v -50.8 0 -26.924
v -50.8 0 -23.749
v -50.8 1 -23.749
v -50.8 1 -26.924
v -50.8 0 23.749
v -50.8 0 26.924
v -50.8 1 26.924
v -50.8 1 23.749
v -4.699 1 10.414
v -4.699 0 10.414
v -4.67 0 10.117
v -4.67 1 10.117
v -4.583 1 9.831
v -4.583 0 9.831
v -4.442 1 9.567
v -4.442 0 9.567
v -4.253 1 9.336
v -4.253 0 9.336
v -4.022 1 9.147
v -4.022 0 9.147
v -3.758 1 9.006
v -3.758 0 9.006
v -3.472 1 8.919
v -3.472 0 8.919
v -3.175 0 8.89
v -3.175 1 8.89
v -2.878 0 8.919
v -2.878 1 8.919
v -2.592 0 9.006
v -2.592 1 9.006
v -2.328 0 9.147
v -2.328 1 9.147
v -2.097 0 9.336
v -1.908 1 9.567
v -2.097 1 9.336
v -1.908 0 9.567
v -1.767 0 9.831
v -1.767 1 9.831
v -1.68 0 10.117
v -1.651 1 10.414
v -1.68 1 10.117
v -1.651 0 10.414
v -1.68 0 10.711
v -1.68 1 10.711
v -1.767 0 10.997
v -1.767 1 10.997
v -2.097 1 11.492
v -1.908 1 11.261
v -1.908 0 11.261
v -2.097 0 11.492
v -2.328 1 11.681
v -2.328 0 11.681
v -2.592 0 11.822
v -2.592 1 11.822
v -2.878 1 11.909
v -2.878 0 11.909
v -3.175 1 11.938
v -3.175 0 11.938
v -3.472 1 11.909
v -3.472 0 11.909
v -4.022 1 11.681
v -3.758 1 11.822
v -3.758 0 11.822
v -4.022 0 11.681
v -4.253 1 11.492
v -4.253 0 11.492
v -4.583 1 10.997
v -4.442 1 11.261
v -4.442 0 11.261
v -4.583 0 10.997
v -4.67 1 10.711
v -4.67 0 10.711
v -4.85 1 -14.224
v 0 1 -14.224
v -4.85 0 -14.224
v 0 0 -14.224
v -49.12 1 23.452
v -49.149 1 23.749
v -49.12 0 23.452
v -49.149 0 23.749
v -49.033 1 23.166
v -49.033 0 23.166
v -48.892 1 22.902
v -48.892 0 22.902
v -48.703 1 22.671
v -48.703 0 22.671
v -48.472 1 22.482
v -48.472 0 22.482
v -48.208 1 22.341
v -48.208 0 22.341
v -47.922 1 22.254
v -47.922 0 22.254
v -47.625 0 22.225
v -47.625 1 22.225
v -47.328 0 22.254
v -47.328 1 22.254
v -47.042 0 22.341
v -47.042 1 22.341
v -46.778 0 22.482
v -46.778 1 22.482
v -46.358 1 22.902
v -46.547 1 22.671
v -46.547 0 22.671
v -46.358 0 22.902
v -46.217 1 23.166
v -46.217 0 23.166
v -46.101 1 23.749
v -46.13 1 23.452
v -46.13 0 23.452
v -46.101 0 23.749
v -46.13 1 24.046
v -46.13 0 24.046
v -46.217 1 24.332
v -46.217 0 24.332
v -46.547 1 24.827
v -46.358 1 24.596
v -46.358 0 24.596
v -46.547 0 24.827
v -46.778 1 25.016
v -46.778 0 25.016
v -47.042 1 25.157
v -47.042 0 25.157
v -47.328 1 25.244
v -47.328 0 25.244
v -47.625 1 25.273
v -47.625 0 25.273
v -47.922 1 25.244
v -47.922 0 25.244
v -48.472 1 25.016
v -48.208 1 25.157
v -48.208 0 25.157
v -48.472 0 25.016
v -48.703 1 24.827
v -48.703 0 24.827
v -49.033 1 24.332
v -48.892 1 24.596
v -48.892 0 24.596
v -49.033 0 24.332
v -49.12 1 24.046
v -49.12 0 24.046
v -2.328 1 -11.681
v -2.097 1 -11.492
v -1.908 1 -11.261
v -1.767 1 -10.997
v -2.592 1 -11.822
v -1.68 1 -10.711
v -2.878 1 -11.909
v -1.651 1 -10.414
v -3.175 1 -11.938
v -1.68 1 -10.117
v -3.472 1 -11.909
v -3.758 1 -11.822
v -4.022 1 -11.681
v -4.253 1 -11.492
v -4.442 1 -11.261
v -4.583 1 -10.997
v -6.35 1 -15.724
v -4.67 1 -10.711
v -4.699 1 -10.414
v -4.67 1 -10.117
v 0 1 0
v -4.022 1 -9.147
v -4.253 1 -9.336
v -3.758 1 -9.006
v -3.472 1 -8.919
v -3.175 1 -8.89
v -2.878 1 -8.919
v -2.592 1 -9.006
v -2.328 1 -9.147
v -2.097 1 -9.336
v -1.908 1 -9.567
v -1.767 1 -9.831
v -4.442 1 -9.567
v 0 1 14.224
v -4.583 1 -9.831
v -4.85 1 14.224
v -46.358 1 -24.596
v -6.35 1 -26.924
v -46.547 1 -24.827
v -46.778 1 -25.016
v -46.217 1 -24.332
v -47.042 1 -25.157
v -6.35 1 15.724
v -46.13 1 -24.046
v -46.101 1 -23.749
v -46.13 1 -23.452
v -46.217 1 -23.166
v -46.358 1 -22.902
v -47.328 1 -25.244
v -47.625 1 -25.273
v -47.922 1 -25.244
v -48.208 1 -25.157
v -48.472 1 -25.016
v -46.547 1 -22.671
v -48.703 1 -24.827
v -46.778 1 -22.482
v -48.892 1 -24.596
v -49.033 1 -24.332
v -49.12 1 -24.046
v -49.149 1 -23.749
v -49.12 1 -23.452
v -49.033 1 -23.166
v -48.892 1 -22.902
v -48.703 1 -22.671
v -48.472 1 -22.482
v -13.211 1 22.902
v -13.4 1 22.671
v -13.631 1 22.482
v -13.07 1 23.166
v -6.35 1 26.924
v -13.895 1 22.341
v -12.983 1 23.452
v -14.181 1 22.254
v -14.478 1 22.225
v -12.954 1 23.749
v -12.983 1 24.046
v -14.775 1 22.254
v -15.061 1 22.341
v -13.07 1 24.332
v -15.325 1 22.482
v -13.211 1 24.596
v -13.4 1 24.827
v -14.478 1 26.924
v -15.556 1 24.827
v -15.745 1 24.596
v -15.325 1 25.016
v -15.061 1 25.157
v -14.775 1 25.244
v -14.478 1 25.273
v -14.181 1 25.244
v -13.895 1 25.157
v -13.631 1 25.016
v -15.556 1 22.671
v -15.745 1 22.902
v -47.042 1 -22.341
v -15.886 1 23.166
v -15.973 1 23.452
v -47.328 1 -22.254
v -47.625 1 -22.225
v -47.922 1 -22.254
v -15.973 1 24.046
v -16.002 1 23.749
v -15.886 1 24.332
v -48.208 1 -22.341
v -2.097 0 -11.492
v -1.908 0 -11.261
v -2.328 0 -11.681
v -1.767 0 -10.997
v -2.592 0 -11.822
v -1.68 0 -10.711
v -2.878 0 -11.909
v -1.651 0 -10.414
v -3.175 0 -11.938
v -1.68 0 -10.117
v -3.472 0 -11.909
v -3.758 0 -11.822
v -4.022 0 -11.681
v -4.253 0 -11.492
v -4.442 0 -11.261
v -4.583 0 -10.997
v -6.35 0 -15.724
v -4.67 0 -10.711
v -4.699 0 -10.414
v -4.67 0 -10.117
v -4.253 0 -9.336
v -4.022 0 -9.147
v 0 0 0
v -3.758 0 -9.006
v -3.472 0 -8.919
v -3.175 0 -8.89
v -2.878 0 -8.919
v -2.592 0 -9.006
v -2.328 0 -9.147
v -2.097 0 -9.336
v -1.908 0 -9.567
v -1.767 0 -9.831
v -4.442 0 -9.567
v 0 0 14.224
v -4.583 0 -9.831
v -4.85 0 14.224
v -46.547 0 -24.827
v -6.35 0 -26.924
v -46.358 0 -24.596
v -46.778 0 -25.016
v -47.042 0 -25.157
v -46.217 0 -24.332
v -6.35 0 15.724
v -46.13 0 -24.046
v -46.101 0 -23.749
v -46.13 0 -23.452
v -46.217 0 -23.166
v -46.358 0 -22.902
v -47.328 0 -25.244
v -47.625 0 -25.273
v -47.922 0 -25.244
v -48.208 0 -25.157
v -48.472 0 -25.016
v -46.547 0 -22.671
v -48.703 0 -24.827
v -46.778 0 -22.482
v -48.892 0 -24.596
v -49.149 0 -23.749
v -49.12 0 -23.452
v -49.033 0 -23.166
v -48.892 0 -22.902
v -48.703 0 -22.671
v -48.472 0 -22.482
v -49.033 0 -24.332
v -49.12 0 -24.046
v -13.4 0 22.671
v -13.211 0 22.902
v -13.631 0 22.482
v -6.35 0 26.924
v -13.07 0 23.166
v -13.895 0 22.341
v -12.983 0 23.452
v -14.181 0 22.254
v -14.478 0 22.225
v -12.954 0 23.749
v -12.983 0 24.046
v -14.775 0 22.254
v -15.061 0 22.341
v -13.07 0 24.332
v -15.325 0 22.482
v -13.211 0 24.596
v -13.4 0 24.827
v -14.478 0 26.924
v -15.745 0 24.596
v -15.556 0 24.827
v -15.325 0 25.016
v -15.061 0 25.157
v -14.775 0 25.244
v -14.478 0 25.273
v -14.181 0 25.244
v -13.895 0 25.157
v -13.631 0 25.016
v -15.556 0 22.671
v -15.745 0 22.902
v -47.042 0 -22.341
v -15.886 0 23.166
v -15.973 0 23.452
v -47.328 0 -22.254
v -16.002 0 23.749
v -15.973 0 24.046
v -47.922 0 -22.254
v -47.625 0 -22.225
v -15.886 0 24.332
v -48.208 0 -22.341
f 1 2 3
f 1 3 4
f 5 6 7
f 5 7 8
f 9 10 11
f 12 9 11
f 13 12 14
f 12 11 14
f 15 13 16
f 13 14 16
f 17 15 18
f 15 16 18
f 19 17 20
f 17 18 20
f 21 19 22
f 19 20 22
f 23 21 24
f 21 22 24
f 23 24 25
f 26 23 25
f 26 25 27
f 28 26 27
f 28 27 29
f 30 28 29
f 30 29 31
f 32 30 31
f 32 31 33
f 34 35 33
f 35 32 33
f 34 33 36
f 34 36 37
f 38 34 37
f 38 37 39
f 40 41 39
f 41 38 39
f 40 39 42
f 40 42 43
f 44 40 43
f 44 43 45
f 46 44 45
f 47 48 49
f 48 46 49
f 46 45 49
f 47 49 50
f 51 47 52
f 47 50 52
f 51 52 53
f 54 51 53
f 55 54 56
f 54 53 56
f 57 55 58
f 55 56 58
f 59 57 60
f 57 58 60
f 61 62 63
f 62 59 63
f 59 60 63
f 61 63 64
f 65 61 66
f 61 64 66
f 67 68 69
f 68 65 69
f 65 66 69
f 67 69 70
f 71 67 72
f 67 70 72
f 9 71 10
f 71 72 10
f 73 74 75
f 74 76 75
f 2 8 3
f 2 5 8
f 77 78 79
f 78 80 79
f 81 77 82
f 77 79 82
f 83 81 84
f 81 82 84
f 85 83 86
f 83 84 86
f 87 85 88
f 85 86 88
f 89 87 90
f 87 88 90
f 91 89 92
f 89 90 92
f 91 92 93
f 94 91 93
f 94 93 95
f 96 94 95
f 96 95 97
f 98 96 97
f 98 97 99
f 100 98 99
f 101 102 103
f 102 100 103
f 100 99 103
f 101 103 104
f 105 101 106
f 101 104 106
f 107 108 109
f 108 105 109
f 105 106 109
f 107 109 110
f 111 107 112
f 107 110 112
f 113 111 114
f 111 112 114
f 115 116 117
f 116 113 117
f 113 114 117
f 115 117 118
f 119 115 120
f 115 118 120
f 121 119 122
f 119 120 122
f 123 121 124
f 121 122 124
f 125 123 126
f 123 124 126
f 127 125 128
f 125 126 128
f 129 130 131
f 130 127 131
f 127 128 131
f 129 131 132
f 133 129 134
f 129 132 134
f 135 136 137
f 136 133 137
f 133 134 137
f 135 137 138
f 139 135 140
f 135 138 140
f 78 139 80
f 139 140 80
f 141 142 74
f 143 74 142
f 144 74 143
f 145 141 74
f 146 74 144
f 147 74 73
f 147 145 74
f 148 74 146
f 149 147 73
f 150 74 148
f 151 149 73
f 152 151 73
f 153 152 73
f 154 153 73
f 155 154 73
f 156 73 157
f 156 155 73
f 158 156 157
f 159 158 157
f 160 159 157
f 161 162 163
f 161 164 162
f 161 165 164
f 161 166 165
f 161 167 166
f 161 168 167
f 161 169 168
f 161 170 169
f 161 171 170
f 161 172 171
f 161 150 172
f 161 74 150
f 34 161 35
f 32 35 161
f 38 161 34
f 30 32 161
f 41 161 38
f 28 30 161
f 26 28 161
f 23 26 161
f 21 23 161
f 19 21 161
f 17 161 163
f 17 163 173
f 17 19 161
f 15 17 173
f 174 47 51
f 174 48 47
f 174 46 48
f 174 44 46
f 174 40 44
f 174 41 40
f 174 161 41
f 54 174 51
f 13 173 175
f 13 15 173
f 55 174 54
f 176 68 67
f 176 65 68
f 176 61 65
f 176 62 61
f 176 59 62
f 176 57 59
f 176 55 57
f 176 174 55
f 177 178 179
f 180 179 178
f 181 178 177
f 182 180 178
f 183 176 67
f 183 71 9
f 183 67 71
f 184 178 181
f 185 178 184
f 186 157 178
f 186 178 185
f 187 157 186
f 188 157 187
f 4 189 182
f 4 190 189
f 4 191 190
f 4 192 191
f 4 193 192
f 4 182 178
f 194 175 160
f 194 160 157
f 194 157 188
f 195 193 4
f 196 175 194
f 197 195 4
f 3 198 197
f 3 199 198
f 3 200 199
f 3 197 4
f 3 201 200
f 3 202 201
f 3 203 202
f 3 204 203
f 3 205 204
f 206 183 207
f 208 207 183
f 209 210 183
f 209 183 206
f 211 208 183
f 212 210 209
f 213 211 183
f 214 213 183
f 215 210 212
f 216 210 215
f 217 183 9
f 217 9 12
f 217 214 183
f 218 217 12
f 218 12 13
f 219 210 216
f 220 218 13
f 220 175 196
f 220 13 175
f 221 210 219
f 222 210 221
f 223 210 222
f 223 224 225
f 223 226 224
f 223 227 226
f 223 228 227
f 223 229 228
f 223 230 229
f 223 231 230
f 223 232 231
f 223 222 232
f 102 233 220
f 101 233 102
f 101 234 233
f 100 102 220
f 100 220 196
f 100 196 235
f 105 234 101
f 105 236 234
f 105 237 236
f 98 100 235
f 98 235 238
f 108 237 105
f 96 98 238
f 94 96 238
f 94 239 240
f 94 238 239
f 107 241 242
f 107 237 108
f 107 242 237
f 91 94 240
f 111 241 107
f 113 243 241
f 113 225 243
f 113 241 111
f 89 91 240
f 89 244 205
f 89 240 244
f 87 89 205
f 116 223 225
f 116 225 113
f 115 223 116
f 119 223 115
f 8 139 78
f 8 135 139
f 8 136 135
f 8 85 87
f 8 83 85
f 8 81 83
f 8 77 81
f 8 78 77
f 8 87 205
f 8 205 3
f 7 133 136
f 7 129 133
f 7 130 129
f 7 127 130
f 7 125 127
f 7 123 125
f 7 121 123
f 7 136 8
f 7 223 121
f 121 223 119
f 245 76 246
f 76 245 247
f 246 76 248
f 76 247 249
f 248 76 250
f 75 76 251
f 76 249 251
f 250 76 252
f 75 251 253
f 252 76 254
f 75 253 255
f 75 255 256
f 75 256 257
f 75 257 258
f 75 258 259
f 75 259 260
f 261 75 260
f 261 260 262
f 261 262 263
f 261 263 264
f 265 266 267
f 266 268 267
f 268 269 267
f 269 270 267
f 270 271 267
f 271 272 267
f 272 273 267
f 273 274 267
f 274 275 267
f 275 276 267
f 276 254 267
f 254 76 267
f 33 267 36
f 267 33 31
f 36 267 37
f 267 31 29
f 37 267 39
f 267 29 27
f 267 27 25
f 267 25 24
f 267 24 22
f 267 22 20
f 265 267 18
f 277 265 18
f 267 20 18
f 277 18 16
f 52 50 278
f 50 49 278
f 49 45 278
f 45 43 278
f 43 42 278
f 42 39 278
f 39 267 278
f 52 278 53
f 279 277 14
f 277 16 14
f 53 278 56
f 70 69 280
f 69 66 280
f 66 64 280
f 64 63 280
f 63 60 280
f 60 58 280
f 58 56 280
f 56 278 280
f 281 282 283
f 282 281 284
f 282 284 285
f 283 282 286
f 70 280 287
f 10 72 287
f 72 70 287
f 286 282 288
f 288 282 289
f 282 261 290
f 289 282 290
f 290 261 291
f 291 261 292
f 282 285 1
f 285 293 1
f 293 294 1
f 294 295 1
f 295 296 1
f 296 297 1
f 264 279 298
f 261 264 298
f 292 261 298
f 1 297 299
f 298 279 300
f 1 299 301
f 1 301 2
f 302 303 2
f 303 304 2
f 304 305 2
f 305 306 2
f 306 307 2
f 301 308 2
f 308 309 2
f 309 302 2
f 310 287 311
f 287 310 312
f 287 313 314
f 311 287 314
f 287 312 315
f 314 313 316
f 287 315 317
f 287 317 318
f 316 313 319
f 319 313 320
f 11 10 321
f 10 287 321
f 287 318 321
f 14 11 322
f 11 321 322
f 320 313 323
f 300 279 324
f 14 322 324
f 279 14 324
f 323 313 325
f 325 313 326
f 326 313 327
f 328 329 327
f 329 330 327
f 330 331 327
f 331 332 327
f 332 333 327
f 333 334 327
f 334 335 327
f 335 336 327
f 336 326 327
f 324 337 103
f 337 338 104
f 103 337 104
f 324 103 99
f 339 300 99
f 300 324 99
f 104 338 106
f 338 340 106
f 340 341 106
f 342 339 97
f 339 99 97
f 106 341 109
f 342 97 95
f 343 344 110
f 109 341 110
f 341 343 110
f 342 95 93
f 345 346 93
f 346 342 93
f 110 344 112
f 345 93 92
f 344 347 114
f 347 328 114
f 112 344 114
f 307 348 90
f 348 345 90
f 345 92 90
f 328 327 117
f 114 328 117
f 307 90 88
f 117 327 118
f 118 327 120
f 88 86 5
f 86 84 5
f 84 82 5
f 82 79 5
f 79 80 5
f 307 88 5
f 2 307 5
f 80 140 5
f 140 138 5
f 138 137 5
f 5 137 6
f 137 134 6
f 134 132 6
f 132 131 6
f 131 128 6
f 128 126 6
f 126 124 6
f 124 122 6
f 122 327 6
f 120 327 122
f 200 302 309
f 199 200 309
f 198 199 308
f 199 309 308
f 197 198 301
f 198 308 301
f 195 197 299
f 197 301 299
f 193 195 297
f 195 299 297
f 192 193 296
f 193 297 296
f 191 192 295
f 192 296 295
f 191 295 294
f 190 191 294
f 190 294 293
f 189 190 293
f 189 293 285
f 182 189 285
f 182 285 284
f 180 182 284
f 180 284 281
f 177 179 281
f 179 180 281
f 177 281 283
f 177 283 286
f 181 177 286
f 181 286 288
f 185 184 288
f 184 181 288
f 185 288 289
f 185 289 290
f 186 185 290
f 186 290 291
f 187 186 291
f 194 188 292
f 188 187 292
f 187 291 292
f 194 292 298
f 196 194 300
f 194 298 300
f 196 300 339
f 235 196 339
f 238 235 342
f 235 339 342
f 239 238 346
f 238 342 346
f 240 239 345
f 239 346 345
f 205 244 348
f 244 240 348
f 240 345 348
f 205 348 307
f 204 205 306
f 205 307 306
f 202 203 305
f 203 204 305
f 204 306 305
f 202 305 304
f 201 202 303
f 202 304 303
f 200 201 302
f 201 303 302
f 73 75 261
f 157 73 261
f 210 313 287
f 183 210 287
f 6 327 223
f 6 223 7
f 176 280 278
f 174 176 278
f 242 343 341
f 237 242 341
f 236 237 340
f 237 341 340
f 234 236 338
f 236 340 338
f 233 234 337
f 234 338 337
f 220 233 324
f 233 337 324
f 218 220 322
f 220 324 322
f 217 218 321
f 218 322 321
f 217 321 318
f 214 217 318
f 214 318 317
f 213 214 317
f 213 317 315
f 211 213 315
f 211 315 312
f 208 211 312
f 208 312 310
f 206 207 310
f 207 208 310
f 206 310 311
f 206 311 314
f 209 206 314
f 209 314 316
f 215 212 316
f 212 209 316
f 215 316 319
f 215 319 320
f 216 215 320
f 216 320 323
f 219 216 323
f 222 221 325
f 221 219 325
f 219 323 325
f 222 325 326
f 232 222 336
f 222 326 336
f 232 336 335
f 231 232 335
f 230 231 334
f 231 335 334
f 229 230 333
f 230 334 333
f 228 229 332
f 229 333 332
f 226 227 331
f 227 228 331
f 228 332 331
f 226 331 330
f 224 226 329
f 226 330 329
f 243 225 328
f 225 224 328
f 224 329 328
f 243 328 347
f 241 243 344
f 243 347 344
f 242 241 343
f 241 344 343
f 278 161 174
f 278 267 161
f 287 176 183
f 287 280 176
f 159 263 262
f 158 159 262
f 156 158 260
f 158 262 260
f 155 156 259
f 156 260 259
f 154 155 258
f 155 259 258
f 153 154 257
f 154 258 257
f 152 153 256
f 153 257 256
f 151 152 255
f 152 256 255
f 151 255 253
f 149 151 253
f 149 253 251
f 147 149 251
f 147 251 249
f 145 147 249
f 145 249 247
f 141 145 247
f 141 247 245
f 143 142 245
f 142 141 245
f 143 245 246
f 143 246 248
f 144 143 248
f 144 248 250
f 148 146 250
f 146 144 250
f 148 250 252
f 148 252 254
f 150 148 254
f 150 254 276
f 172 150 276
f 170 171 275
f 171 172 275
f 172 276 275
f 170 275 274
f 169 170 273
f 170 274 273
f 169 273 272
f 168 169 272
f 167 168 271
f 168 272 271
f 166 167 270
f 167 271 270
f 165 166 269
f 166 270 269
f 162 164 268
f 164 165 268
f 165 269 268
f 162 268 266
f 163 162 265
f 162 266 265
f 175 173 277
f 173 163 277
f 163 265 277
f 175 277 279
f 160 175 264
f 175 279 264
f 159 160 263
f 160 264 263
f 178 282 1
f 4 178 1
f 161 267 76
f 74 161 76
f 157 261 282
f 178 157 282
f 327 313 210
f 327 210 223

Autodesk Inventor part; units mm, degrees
ref_plane "YZ Plane" through (0, 0, 0) normal (1, 0, 0) x (0, 1, 0)
ref_plane "XZ Plane" through (0, 0, 0) normal (0, 1, 0) x (-1, 0, 0)
ref_plane "XY Plane" through (0, 0, 0) normal (0, 0, 1) x (1, 0, 0)
sketch "Sketch1" plane through (0, 0, 0) normal (0, 1, 0) x (-1, 0, 0)
  line L0 (50.8, 26.924) -> (50.8, -26.924)
  line L1 (6.35, 26.924) -> (6.35, 15.724)
  line L2 (4.85, 14.224) -> (0, 14.224)
  line L3 (6.35, 26.924) -> (50.8, 26.924)
  line L4 (0, -14.224) -> (4.85, -14.224)
  line L5 (6.35, -15.724) -> (6.35, -26.924)
  line L6 (0, 0) -> (0, 14.224)
  line L7 (0, 0) -> (0, -14.224)
  line L8 (6.35, -26.924) -> (50.8, -26.924)
  line L9 (4.85, 14.224) -> (6.35, 15.724)
  line L10 (4.85, -14.224) -> (6.35, -15.724)
  line L11 (50.8, 26.924) -> (50.8, 23.749)
  circle A0 centre (47.625, 23.749) radius 1.524
  line L12 (50.8, -26.924) -> (50.8, -23.749)
  circle A1 centre (47.625, -23.749) radius 1.524
  line L13 (6.35, 26.924) -> (14.478, 26.924)
  circle A2 centre (14.478, 23.749) radius 1.524
  circle A3 centre (3.175, -10.414) radius 1.524
  circle A4 centre (3.175, 10.414) radius 1.524
  point P0 (6.35, 14.224)
  point P1 (6.35, -14.224)
extrude "Extrusion1" add sketch "Sketch1" along normal blind 1
properties part number "Pixy"
